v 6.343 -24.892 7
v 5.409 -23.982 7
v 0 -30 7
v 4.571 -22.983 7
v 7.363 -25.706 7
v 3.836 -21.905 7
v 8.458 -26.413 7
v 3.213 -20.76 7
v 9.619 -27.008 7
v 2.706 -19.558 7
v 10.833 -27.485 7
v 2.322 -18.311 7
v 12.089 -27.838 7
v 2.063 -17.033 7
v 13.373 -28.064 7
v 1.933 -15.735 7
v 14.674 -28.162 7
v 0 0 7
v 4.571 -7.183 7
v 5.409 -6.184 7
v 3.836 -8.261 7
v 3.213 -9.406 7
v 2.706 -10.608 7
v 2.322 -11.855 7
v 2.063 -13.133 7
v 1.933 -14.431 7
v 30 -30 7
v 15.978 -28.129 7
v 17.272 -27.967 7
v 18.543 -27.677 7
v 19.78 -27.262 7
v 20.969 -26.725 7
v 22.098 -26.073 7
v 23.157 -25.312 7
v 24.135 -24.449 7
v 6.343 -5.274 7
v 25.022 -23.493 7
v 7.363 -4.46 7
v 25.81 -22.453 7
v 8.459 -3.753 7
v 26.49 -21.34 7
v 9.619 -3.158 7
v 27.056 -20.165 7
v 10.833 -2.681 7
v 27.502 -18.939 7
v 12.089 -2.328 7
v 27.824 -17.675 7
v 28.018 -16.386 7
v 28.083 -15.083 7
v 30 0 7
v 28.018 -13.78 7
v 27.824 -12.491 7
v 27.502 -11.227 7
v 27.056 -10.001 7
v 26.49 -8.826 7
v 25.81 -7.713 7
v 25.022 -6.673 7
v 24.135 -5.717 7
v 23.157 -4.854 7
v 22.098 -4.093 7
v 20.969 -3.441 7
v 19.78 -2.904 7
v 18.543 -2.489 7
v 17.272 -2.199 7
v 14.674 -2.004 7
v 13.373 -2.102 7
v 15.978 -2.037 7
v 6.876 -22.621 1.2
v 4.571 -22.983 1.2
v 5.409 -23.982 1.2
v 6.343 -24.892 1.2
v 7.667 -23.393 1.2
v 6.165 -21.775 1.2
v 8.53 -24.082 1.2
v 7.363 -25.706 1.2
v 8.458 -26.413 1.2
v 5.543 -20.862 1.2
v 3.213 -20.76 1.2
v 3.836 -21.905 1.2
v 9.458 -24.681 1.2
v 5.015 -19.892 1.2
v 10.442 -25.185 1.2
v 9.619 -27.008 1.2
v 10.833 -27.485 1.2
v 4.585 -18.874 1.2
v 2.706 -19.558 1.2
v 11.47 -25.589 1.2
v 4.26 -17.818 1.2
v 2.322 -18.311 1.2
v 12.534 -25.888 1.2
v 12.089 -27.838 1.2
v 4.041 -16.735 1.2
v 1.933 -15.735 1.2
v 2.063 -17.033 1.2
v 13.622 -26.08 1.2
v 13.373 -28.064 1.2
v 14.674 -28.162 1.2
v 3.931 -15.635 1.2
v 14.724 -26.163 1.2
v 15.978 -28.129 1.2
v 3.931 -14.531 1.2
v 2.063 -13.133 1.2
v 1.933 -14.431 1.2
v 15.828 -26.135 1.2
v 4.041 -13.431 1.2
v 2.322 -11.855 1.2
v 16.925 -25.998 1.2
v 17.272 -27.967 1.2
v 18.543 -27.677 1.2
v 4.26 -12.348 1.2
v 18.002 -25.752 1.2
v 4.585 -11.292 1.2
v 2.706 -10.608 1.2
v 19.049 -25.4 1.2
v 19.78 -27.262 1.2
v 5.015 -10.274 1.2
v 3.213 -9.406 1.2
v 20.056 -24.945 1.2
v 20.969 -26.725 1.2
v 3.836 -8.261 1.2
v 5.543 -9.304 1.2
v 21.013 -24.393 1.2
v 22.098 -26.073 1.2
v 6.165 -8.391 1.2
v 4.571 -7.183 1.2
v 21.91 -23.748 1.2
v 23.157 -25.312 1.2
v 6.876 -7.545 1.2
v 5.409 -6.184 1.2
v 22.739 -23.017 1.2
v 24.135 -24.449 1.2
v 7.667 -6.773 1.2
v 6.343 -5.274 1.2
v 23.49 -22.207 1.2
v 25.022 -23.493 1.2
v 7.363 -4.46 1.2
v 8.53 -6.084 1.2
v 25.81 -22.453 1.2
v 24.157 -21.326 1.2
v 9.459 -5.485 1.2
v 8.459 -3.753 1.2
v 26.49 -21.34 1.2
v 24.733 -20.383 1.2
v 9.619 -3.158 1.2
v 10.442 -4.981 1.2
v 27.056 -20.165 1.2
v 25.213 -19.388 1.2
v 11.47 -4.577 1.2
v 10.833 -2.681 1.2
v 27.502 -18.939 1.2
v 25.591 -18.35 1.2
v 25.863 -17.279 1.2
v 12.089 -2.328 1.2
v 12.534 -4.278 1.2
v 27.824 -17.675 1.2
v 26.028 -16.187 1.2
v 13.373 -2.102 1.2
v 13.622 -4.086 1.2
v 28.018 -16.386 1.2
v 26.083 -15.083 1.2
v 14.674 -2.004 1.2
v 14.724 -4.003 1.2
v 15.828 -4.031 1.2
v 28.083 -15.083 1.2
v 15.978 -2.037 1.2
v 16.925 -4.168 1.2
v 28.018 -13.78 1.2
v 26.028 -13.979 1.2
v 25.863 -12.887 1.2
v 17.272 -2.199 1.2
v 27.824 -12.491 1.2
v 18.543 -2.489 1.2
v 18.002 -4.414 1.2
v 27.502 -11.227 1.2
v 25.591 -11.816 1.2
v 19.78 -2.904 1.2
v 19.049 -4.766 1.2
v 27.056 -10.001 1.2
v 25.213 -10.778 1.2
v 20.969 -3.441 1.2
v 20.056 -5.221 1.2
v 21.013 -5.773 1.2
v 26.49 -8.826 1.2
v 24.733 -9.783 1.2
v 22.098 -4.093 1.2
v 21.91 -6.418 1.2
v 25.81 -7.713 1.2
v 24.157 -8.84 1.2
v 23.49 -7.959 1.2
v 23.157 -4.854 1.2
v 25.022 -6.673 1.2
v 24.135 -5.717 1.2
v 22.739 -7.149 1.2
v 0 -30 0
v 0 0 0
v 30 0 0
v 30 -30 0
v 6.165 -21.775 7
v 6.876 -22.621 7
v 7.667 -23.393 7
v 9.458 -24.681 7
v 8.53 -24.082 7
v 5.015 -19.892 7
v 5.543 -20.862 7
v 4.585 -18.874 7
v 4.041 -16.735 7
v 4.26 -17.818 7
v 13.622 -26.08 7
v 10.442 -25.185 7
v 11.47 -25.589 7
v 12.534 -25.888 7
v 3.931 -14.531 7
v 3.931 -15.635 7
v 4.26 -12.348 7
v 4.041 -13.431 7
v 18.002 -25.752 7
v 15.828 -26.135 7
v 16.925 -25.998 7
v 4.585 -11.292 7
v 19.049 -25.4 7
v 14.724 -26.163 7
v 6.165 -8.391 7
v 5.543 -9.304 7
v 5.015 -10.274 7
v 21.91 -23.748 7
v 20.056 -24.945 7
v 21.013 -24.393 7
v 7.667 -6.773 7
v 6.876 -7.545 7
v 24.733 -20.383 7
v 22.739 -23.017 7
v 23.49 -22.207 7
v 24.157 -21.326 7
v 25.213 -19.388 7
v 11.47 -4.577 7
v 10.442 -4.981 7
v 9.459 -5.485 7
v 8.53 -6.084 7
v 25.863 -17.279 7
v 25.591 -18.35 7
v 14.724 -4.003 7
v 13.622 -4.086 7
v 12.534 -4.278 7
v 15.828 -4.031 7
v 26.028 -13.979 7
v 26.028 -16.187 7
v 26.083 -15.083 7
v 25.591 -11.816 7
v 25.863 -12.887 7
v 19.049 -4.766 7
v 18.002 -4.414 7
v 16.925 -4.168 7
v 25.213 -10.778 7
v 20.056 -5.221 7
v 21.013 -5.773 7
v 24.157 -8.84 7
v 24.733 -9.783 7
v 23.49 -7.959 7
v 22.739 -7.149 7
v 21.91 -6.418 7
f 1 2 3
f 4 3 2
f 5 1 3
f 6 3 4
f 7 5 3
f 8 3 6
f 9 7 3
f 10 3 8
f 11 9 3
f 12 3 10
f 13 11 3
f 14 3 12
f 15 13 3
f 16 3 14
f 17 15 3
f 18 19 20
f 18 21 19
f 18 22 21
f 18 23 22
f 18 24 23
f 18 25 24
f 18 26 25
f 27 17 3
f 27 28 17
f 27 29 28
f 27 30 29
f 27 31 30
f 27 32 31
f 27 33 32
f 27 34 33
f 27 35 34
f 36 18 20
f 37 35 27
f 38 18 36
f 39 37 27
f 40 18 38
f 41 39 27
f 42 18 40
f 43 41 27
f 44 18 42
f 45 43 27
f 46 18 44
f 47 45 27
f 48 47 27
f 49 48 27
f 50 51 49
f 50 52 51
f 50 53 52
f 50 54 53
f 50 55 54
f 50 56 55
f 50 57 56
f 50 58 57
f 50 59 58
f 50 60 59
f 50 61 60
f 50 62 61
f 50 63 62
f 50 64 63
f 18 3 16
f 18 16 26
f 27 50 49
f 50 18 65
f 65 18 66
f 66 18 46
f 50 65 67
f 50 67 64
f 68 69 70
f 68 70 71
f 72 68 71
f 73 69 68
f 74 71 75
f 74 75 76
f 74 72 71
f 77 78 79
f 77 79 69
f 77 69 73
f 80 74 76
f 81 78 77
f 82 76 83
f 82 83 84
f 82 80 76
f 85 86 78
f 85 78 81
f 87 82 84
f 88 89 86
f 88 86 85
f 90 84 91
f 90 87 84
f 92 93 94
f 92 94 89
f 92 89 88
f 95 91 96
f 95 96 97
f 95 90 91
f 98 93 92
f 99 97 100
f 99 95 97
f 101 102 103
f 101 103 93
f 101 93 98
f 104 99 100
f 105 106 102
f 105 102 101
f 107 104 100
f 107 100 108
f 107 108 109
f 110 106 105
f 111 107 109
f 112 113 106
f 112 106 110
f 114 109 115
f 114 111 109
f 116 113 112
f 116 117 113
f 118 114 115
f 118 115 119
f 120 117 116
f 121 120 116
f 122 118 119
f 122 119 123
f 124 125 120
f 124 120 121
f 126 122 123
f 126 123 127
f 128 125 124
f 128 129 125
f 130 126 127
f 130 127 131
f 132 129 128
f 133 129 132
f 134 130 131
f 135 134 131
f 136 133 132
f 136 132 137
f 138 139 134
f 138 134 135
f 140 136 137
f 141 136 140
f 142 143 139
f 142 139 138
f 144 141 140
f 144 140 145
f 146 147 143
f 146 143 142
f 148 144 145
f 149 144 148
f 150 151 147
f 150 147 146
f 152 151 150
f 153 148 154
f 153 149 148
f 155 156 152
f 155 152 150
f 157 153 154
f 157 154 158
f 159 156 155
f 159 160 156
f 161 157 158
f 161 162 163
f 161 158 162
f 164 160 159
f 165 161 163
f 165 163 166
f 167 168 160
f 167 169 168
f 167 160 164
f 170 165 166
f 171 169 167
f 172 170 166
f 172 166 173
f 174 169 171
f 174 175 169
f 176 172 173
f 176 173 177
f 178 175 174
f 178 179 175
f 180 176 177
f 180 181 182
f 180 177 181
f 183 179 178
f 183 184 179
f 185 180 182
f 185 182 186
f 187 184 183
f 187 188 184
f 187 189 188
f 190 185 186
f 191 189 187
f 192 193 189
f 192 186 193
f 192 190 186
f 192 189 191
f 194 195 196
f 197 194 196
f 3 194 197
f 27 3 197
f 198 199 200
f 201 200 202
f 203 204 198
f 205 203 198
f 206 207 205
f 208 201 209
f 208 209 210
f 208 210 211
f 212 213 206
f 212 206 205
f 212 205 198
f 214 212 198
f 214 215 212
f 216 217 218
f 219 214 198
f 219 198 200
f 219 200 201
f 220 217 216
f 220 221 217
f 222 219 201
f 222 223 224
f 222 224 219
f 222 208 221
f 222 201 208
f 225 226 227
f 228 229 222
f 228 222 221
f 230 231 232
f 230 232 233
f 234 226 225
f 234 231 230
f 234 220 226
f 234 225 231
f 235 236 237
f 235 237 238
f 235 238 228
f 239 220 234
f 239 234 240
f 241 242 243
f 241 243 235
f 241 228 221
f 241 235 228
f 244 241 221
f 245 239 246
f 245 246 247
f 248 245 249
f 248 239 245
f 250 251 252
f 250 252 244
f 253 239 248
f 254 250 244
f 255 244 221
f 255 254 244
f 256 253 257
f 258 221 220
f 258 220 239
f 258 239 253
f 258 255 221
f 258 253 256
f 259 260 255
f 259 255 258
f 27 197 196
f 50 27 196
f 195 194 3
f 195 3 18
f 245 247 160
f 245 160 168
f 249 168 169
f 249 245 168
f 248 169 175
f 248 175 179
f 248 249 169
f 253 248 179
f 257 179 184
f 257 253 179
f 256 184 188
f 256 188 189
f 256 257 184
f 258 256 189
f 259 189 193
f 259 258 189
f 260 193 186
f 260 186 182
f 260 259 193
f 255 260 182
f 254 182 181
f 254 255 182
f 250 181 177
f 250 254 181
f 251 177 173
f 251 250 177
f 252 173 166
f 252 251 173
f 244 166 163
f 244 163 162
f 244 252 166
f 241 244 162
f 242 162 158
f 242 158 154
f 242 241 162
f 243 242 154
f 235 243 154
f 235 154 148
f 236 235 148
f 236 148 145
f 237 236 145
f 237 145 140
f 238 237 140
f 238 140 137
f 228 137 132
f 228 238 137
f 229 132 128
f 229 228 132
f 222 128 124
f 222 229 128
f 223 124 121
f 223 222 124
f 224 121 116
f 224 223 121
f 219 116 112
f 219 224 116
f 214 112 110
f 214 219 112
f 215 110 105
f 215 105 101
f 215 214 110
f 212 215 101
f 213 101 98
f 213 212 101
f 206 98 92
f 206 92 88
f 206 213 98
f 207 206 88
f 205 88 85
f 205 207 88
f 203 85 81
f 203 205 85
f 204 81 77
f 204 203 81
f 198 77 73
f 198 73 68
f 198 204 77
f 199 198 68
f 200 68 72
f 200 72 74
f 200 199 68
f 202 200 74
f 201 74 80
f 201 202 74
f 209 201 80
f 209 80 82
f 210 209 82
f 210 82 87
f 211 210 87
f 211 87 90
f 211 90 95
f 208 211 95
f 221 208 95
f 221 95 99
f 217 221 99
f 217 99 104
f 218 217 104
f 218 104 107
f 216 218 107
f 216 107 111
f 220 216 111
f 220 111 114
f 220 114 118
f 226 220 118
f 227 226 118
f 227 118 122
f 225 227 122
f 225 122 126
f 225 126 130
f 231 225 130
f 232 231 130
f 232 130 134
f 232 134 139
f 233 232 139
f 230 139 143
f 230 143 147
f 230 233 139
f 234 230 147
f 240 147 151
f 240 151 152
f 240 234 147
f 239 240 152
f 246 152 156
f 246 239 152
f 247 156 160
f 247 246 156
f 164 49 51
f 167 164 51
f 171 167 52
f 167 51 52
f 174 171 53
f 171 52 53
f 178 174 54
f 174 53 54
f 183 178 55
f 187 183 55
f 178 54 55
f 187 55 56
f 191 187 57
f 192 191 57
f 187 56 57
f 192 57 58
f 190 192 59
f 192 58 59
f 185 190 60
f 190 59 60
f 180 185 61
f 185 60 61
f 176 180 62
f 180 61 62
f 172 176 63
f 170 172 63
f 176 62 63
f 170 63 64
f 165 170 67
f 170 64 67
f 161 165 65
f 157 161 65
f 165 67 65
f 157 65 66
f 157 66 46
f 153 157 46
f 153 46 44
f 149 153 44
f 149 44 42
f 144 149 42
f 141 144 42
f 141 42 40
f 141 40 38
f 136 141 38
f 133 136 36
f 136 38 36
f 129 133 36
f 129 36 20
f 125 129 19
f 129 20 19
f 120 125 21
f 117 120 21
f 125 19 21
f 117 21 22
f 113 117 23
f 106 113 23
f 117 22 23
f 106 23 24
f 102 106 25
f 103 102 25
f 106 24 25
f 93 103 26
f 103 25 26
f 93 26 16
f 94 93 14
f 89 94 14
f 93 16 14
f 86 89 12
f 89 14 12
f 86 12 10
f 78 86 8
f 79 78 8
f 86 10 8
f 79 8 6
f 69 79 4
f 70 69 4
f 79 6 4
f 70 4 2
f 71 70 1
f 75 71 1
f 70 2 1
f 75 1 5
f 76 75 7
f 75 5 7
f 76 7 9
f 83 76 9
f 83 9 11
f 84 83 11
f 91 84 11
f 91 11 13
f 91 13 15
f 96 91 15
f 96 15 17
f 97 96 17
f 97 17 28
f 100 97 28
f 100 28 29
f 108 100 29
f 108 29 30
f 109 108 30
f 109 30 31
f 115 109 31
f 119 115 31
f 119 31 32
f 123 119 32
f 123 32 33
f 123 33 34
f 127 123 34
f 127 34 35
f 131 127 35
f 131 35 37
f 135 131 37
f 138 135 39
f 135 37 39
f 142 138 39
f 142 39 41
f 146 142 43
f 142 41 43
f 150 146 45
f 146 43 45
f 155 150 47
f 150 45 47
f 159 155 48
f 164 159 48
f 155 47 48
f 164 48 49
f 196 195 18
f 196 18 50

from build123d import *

# Parameters (mm, degrees)
SKETCH_1_W          = 30
SKETCH_1_H          = 30
EXTRUDE_1_DEPTH     = 7
SKETCH_5_R          = 13.083
SKETCH_5_R_2        = 11.083
CUT_EXTRUDE_1_DEPTH = 5.8


with BuildPart() as part:
    # 草图1 → 凸台-拉伸1 (new body)
    with BuildSketch(Plane.XY):
        with Locations((15, -15)):
            Rectangle(SKETCH_1_W, SKETCH_1_H)
    extrude(amount=EXTRUDE_1_DEPTH)

    # 草图5 → 切除-拉伸1 (cut)
    with BuildSketch(Plane.XY.offset(7)):
        with Locations((15, -15.083)):
            Circle(SKETCH_5_R)
        with Locations((15, -15.083)):
            Circle(SKETCH_5_R_2, mode=Mode.SUBTRACT)
    extrude(amount=-CUT_EXTRUDE_1_DEPTH, mode=Mode.SUBTRACT)


solid = part.part
